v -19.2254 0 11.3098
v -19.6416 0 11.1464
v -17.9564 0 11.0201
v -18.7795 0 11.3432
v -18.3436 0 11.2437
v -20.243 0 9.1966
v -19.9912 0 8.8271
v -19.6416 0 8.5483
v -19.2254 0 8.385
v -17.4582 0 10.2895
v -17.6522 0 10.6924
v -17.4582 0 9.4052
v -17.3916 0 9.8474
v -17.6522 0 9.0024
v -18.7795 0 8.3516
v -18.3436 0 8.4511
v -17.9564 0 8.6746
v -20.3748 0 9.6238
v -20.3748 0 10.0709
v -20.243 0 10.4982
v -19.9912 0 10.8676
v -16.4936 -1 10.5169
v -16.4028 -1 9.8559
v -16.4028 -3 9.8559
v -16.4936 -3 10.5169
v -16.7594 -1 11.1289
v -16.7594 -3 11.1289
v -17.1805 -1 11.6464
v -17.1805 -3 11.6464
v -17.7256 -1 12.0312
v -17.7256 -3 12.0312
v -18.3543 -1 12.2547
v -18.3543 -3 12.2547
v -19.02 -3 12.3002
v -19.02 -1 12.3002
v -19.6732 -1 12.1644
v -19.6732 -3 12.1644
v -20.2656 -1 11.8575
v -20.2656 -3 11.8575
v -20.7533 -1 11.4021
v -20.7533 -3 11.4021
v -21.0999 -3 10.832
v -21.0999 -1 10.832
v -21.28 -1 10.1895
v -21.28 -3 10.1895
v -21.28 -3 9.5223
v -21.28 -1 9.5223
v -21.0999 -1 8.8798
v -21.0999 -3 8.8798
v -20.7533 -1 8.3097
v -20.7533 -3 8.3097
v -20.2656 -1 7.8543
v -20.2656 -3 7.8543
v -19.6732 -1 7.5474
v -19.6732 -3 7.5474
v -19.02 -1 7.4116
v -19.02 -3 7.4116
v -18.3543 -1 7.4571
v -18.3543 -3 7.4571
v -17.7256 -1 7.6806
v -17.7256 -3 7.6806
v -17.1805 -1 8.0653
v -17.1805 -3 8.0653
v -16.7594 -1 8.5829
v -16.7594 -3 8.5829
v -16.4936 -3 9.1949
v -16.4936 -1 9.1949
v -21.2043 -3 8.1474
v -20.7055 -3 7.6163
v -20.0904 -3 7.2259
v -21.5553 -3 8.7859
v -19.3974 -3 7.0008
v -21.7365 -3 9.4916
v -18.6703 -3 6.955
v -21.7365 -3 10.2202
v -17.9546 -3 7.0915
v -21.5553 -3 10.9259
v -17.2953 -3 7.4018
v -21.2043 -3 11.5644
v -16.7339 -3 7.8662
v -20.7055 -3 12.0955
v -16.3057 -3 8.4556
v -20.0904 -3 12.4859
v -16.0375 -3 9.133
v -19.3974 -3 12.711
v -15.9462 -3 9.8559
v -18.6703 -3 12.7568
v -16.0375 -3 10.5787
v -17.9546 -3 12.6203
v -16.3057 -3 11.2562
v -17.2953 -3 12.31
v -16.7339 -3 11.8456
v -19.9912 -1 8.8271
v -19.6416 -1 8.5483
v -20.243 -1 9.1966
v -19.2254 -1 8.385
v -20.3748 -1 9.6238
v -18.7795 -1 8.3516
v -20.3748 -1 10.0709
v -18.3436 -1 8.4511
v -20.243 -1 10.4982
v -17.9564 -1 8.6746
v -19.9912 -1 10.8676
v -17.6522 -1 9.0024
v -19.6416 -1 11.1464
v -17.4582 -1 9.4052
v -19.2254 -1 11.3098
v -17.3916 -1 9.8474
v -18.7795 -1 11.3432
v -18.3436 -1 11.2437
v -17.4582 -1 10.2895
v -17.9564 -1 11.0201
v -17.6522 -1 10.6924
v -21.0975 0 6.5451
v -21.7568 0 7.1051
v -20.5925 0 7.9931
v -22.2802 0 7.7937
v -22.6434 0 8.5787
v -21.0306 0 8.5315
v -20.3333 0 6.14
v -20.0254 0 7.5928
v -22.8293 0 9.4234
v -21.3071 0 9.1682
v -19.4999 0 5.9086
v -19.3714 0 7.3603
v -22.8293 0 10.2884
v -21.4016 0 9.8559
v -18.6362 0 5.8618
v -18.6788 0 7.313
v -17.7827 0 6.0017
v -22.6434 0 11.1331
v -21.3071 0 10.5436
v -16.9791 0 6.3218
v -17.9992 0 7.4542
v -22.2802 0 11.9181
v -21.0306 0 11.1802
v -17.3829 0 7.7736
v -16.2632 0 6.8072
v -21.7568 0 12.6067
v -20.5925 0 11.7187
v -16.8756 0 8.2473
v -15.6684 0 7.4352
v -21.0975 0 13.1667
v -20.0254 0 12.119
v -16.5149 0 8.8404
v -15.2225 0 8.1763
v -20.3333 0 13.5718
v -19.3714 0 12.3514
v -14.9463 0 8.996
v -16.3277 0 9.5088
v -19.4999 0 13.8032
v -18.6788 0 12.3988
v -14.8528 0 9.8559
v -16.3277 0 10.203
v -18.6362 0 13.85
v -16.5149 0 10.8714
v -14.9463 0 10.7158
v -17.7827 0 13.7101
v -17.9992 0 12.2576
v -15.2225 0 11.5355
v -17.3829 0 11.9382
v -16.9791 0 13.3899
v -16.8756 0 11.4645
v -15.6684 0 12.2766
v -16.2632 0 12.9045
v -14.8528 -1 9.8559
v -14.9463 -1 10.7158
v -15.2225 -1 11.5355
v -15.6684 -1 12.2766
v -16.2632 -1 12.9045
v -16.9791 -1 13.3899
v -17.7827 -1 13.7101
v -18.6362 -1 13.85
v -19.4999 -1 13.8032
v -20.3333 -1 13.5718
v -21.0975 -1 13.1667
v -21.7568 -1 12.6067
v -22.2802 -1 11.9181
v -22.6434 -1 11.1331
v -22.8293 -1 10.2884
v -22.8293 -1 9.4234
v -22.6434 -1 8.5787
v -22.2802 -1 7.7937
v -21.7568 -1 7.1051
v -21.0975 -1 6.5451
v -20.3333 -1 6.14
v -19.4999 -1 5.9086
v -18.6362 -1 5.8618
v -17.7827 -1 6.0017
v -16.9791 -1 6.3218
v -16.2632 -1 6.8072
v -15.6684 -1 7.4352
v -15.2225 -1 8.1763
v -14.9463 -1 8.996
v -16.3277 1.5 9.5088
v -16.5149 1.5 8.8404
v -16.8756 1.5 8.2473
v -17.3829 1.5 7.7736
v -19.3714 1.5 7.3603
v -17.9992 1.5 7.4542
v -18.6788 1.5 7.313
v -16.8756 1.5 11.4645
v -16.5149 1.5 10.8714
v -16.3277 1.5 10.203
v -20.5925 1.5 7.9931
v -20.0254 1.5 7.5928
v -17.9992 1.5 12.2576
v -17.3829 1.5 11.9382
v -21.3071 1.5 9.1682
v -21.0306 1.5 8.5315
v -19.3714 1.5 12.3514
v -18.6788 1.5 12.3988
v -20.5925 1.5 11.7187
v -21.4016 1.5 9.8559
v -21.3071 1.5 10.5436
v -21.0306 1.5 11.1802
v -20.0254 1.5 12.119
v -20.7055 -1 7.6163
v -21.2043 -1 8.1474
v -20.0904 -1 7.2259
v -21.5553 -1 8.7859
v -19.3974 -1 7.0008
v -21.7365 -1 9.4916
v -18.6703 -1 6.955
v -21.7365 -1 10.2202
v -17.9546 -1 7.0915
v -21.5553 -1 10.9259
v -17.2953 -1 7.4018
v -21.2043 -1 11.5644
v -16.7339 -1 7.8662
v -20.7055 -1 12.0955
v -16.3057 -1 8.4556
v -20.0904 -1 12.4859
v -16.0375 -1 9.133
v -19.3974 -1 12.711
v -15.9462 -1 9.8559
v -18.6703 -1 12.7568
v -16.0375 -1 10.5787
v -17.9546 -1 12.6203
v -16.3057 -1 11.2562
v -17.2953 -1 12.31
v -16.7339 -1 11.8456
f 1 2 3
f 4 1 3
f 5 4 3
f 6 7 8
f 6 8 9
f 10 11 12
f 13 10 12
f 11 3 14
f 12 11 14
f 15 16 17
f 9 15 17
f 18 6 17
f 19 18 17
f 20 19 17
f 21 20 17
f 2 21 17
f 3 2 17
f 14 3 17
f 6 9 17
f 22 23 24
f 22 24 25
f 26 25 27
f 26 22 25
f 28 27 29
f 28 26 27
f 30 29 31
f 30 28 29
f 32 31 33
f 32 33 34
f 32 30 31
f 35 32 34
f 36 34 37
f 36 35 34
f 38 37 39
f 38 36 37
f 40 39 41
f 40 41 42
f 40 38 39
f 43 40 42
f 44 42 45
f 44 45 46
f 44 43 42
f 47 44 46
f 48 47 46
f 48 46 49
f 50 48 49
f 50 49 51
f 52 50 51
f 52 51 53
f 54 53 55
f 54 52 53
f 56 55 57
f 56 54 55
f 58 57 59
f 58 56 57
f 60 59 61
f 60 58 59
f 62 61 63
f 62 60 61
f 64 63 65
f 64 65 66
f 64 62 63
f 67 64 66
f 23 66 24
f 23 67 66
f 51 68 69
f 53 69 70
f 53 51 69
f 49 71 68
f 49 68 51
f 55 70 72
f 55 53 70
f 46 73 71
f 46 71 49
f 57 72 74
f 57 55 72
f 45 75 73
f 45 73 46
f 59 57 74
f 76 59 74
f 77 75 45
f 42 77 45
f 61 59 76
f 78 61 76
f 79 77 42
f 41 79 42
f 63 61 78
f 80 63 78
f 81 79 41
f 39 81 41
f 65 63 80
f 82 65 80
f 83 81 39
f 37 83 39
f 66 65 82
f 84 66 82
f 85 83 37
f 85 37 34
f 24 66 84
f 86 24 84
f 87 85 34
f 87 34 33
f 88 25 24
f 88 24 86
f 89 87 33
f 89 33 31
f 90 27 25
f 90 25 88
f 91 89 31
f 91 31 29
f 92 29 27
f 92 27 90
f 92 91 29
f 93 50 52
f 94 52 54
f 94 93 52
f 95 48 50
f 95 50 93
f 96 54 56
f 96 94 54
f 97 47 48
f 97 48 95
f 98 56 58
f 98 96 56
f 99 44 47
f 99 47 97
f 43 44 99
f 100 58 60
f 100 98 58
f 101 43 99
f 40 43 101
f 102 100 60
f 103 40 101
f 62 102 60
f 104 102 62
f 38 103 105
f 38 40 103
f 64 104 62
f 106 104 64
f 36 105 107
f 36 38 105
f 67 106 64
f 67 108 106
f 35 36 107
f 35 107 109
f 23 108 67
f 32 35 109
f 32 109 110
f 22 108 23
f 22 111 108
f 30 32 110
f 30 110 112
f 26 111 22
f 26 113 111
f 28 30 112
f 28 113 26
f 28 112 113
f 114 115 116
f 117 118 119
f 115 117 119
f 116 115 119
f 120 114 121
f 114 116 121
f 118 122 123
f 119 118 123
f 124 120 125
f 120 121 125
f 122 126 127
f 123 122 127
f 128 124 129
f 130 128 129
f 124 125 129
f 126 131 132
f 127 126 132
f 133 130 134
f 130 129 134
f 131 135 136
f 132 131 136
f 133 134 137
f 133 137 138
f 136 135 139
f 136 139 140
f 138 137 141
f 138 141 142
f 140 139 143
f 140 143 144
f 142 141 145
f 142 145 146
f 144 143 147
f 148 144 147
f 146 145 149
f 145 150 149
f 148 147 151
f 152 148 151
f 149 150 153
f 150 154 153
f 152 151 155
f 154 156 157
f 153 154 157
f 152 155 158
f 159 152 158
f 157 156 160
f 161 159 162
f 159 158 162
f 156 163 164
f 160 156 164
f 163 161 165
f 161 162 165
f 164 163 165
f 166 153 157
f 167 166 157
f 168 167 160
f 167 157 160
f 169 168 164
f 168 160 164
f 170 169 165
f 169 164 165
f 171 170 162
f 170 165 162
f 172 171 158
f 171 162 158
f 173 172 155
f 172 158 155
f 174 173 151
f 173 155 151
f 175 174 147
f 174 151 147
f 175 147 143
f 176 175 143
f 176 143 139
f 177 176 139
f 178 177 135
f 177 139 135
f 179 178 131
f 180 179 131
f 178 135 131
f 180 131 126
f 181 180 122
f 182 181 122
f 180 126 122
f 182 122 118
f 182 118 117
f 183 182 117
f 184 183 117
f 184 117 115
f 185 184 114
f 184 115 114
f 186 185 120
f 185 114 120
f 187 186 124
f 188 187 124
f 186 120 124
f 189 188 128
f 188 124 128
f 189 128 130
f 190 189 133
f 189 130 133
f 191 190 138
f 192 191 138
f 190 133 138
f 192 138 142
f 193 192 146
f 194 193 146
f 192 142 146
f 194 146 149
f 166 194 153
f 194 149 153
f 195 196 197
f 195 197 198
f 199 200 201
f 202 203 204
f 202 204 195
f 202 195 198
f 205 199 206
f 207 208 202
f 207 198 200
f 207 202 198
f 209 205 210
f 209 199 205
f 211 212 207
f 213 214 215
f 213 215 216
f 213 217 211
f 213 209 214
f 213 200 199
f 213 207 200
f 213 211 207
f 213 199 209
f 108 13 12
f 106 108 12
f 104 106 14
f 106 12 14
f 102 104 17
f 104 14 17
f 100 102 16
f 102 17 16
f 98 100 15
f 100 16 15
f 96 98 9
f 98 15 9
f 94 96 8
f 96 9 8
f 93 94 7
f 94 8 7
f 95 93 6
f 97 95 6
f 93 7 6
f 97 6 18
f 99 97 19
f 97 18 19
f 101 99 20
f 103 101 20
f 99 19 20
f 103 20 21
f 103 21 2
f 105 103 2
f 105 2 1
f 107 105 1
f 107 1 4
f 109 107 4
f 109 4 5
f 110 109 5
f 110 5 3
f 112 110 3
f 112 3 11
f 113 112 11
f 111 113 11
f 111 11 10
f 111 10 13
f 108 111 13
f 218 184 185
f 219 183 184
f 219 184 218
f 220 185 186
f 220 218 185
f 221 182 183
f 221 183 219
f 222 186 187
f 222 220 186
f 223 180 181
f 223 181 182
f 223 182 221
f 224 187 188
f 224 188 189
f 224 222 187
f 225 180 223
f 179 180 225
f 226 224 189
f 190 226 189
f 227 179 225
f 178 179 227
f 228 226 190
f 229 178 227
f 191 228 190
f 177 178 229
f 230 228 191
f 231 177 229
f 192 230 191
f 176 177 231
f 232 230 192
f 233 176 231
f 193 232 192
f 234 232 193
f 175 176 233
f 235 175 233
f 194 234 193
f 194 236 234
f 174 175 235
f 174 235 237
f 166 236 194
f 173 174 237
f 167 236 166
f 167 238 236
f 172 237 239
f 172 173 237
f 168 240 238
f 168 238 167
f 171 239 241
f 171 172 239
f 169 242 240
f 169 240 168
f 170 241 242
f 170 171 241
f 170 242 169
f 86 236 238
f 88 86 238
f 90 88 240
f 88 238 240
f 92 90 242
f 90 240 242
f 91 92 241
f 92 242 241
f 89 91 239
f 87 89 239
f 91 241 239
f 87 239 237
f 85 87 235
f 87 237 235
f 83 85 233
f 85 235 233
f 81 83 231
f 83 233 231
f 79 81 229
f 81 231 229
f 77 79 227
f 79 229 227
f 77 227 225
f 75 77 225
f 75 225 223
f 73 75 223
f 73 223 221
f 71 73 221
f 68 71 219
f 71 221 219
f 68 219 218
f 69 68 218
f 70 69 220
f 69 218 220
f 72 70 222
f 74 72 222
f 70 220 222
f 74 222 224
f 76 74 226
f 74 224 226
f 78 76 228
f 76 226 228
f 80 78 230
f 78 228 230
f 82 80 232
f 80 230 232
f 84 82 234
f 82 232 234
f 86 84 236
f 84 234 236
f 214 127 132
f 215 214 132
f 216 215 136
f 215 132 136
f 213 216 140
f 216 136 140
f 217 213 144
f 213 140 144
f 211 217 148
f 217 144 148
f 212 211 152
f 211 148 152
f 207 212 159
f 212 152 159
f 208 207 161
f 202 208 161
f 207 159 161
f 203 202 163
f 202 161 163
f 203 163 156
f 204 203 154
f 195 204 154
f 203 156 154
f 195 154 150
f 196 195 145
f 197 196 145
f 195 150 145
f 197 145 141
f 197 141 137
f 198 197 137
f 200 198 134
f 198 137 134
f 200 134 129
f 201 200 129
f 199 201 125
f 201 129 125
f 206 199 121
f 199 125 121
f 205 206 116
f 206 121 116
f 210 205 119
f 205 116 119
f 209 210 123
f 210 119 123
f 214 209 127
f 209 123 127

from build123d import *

# Parameters (mm, degrees)
F0_R     = 4
F0_R_2   = 3.4982450121
F0_R_3   = 3.0047107059
F1_DEPTH = 1
F2_R     = 2.9066223448
F2_R_2   = 2.45
F3_DEPTH = 2
F4_R     = 2.5488613676
F5_DEPTH = 1.5
F7_D     = 3
F7_DEPTH = 2
F7_TIP   = 0.9012909285


with BuildPart() as f1:
    # F0 (on Front) → F1 (new body)
    with BuildSketch(Plane.XZ):
        with Locations((-18.8527759165, 9.8558971658)):
            Circle(F0_R)
        with Locations((-18.8527759165, 9.8558971658)):
            Circle(F0_R_2, mode=Mode.SUBTRACT)
        with Locations((-18.8527759165, 9.8558971658)):
            Circle(F0_R_2)
        with Locations((-18.8527759165, 9.8558971658)):
            Circle(F0_R_3, mode=Mode.SUBTRACT)
        with Locations((-18.8527759165, 9.8558971658)):
            Circle(F0_R_3)
    extrude(amount=F1_DEPTH)

    # F2 (on face) → F3 (join)
    with BuildSketch(Plane.XZ.offset(1)):
        with Locations((-18.8527759165, 9.8558971658)):
            Circle(F2_R)
        with Locations((-18.8527759165, 9.8558971658)):
            Circle(F2_R_2, mode=Mode.SUBTRACT)
    extrude(amount=F3_DEPTH)

    # F4 (on face) → F5 (join)
    with BuildSketch(Plane(origin=(0, 0, 0), x_dir=(-1, 0, 0), z_dir=(0, 1, 0))):
        with Locations((18.8527759165, 9.8558971658)):
            Circle(F4_R)
    extrude(amount=F5_DEPTH)

    # F7 (one way)
    with BuildSketch(Plane(origin=(0, 0, 0), x_dir=(1, 0, 0), z_dir=(0, 1, 0))):
        with Locations((-18.891595304, -9.8473792896)):
            Circle(F7_D / 2)
    extrude(amount=-F7_DEPTH, mode=Mode.SUBTRACT)
    with Locations(Plane(origin=(0, 0, 0), x_dir=(1, 0, 0), z_dir=(0, 1, 0))):
        with Locations((-18.891595304, -9.8473792896)):
            with Locations((0, 0, -(F7_DEPTH + F7_TIP / 2))):  # 118° drill point
                Cone(0, F7_D / 2, F7_TIP, mode=Mode.SUBTRACT)


solid = f1.part
